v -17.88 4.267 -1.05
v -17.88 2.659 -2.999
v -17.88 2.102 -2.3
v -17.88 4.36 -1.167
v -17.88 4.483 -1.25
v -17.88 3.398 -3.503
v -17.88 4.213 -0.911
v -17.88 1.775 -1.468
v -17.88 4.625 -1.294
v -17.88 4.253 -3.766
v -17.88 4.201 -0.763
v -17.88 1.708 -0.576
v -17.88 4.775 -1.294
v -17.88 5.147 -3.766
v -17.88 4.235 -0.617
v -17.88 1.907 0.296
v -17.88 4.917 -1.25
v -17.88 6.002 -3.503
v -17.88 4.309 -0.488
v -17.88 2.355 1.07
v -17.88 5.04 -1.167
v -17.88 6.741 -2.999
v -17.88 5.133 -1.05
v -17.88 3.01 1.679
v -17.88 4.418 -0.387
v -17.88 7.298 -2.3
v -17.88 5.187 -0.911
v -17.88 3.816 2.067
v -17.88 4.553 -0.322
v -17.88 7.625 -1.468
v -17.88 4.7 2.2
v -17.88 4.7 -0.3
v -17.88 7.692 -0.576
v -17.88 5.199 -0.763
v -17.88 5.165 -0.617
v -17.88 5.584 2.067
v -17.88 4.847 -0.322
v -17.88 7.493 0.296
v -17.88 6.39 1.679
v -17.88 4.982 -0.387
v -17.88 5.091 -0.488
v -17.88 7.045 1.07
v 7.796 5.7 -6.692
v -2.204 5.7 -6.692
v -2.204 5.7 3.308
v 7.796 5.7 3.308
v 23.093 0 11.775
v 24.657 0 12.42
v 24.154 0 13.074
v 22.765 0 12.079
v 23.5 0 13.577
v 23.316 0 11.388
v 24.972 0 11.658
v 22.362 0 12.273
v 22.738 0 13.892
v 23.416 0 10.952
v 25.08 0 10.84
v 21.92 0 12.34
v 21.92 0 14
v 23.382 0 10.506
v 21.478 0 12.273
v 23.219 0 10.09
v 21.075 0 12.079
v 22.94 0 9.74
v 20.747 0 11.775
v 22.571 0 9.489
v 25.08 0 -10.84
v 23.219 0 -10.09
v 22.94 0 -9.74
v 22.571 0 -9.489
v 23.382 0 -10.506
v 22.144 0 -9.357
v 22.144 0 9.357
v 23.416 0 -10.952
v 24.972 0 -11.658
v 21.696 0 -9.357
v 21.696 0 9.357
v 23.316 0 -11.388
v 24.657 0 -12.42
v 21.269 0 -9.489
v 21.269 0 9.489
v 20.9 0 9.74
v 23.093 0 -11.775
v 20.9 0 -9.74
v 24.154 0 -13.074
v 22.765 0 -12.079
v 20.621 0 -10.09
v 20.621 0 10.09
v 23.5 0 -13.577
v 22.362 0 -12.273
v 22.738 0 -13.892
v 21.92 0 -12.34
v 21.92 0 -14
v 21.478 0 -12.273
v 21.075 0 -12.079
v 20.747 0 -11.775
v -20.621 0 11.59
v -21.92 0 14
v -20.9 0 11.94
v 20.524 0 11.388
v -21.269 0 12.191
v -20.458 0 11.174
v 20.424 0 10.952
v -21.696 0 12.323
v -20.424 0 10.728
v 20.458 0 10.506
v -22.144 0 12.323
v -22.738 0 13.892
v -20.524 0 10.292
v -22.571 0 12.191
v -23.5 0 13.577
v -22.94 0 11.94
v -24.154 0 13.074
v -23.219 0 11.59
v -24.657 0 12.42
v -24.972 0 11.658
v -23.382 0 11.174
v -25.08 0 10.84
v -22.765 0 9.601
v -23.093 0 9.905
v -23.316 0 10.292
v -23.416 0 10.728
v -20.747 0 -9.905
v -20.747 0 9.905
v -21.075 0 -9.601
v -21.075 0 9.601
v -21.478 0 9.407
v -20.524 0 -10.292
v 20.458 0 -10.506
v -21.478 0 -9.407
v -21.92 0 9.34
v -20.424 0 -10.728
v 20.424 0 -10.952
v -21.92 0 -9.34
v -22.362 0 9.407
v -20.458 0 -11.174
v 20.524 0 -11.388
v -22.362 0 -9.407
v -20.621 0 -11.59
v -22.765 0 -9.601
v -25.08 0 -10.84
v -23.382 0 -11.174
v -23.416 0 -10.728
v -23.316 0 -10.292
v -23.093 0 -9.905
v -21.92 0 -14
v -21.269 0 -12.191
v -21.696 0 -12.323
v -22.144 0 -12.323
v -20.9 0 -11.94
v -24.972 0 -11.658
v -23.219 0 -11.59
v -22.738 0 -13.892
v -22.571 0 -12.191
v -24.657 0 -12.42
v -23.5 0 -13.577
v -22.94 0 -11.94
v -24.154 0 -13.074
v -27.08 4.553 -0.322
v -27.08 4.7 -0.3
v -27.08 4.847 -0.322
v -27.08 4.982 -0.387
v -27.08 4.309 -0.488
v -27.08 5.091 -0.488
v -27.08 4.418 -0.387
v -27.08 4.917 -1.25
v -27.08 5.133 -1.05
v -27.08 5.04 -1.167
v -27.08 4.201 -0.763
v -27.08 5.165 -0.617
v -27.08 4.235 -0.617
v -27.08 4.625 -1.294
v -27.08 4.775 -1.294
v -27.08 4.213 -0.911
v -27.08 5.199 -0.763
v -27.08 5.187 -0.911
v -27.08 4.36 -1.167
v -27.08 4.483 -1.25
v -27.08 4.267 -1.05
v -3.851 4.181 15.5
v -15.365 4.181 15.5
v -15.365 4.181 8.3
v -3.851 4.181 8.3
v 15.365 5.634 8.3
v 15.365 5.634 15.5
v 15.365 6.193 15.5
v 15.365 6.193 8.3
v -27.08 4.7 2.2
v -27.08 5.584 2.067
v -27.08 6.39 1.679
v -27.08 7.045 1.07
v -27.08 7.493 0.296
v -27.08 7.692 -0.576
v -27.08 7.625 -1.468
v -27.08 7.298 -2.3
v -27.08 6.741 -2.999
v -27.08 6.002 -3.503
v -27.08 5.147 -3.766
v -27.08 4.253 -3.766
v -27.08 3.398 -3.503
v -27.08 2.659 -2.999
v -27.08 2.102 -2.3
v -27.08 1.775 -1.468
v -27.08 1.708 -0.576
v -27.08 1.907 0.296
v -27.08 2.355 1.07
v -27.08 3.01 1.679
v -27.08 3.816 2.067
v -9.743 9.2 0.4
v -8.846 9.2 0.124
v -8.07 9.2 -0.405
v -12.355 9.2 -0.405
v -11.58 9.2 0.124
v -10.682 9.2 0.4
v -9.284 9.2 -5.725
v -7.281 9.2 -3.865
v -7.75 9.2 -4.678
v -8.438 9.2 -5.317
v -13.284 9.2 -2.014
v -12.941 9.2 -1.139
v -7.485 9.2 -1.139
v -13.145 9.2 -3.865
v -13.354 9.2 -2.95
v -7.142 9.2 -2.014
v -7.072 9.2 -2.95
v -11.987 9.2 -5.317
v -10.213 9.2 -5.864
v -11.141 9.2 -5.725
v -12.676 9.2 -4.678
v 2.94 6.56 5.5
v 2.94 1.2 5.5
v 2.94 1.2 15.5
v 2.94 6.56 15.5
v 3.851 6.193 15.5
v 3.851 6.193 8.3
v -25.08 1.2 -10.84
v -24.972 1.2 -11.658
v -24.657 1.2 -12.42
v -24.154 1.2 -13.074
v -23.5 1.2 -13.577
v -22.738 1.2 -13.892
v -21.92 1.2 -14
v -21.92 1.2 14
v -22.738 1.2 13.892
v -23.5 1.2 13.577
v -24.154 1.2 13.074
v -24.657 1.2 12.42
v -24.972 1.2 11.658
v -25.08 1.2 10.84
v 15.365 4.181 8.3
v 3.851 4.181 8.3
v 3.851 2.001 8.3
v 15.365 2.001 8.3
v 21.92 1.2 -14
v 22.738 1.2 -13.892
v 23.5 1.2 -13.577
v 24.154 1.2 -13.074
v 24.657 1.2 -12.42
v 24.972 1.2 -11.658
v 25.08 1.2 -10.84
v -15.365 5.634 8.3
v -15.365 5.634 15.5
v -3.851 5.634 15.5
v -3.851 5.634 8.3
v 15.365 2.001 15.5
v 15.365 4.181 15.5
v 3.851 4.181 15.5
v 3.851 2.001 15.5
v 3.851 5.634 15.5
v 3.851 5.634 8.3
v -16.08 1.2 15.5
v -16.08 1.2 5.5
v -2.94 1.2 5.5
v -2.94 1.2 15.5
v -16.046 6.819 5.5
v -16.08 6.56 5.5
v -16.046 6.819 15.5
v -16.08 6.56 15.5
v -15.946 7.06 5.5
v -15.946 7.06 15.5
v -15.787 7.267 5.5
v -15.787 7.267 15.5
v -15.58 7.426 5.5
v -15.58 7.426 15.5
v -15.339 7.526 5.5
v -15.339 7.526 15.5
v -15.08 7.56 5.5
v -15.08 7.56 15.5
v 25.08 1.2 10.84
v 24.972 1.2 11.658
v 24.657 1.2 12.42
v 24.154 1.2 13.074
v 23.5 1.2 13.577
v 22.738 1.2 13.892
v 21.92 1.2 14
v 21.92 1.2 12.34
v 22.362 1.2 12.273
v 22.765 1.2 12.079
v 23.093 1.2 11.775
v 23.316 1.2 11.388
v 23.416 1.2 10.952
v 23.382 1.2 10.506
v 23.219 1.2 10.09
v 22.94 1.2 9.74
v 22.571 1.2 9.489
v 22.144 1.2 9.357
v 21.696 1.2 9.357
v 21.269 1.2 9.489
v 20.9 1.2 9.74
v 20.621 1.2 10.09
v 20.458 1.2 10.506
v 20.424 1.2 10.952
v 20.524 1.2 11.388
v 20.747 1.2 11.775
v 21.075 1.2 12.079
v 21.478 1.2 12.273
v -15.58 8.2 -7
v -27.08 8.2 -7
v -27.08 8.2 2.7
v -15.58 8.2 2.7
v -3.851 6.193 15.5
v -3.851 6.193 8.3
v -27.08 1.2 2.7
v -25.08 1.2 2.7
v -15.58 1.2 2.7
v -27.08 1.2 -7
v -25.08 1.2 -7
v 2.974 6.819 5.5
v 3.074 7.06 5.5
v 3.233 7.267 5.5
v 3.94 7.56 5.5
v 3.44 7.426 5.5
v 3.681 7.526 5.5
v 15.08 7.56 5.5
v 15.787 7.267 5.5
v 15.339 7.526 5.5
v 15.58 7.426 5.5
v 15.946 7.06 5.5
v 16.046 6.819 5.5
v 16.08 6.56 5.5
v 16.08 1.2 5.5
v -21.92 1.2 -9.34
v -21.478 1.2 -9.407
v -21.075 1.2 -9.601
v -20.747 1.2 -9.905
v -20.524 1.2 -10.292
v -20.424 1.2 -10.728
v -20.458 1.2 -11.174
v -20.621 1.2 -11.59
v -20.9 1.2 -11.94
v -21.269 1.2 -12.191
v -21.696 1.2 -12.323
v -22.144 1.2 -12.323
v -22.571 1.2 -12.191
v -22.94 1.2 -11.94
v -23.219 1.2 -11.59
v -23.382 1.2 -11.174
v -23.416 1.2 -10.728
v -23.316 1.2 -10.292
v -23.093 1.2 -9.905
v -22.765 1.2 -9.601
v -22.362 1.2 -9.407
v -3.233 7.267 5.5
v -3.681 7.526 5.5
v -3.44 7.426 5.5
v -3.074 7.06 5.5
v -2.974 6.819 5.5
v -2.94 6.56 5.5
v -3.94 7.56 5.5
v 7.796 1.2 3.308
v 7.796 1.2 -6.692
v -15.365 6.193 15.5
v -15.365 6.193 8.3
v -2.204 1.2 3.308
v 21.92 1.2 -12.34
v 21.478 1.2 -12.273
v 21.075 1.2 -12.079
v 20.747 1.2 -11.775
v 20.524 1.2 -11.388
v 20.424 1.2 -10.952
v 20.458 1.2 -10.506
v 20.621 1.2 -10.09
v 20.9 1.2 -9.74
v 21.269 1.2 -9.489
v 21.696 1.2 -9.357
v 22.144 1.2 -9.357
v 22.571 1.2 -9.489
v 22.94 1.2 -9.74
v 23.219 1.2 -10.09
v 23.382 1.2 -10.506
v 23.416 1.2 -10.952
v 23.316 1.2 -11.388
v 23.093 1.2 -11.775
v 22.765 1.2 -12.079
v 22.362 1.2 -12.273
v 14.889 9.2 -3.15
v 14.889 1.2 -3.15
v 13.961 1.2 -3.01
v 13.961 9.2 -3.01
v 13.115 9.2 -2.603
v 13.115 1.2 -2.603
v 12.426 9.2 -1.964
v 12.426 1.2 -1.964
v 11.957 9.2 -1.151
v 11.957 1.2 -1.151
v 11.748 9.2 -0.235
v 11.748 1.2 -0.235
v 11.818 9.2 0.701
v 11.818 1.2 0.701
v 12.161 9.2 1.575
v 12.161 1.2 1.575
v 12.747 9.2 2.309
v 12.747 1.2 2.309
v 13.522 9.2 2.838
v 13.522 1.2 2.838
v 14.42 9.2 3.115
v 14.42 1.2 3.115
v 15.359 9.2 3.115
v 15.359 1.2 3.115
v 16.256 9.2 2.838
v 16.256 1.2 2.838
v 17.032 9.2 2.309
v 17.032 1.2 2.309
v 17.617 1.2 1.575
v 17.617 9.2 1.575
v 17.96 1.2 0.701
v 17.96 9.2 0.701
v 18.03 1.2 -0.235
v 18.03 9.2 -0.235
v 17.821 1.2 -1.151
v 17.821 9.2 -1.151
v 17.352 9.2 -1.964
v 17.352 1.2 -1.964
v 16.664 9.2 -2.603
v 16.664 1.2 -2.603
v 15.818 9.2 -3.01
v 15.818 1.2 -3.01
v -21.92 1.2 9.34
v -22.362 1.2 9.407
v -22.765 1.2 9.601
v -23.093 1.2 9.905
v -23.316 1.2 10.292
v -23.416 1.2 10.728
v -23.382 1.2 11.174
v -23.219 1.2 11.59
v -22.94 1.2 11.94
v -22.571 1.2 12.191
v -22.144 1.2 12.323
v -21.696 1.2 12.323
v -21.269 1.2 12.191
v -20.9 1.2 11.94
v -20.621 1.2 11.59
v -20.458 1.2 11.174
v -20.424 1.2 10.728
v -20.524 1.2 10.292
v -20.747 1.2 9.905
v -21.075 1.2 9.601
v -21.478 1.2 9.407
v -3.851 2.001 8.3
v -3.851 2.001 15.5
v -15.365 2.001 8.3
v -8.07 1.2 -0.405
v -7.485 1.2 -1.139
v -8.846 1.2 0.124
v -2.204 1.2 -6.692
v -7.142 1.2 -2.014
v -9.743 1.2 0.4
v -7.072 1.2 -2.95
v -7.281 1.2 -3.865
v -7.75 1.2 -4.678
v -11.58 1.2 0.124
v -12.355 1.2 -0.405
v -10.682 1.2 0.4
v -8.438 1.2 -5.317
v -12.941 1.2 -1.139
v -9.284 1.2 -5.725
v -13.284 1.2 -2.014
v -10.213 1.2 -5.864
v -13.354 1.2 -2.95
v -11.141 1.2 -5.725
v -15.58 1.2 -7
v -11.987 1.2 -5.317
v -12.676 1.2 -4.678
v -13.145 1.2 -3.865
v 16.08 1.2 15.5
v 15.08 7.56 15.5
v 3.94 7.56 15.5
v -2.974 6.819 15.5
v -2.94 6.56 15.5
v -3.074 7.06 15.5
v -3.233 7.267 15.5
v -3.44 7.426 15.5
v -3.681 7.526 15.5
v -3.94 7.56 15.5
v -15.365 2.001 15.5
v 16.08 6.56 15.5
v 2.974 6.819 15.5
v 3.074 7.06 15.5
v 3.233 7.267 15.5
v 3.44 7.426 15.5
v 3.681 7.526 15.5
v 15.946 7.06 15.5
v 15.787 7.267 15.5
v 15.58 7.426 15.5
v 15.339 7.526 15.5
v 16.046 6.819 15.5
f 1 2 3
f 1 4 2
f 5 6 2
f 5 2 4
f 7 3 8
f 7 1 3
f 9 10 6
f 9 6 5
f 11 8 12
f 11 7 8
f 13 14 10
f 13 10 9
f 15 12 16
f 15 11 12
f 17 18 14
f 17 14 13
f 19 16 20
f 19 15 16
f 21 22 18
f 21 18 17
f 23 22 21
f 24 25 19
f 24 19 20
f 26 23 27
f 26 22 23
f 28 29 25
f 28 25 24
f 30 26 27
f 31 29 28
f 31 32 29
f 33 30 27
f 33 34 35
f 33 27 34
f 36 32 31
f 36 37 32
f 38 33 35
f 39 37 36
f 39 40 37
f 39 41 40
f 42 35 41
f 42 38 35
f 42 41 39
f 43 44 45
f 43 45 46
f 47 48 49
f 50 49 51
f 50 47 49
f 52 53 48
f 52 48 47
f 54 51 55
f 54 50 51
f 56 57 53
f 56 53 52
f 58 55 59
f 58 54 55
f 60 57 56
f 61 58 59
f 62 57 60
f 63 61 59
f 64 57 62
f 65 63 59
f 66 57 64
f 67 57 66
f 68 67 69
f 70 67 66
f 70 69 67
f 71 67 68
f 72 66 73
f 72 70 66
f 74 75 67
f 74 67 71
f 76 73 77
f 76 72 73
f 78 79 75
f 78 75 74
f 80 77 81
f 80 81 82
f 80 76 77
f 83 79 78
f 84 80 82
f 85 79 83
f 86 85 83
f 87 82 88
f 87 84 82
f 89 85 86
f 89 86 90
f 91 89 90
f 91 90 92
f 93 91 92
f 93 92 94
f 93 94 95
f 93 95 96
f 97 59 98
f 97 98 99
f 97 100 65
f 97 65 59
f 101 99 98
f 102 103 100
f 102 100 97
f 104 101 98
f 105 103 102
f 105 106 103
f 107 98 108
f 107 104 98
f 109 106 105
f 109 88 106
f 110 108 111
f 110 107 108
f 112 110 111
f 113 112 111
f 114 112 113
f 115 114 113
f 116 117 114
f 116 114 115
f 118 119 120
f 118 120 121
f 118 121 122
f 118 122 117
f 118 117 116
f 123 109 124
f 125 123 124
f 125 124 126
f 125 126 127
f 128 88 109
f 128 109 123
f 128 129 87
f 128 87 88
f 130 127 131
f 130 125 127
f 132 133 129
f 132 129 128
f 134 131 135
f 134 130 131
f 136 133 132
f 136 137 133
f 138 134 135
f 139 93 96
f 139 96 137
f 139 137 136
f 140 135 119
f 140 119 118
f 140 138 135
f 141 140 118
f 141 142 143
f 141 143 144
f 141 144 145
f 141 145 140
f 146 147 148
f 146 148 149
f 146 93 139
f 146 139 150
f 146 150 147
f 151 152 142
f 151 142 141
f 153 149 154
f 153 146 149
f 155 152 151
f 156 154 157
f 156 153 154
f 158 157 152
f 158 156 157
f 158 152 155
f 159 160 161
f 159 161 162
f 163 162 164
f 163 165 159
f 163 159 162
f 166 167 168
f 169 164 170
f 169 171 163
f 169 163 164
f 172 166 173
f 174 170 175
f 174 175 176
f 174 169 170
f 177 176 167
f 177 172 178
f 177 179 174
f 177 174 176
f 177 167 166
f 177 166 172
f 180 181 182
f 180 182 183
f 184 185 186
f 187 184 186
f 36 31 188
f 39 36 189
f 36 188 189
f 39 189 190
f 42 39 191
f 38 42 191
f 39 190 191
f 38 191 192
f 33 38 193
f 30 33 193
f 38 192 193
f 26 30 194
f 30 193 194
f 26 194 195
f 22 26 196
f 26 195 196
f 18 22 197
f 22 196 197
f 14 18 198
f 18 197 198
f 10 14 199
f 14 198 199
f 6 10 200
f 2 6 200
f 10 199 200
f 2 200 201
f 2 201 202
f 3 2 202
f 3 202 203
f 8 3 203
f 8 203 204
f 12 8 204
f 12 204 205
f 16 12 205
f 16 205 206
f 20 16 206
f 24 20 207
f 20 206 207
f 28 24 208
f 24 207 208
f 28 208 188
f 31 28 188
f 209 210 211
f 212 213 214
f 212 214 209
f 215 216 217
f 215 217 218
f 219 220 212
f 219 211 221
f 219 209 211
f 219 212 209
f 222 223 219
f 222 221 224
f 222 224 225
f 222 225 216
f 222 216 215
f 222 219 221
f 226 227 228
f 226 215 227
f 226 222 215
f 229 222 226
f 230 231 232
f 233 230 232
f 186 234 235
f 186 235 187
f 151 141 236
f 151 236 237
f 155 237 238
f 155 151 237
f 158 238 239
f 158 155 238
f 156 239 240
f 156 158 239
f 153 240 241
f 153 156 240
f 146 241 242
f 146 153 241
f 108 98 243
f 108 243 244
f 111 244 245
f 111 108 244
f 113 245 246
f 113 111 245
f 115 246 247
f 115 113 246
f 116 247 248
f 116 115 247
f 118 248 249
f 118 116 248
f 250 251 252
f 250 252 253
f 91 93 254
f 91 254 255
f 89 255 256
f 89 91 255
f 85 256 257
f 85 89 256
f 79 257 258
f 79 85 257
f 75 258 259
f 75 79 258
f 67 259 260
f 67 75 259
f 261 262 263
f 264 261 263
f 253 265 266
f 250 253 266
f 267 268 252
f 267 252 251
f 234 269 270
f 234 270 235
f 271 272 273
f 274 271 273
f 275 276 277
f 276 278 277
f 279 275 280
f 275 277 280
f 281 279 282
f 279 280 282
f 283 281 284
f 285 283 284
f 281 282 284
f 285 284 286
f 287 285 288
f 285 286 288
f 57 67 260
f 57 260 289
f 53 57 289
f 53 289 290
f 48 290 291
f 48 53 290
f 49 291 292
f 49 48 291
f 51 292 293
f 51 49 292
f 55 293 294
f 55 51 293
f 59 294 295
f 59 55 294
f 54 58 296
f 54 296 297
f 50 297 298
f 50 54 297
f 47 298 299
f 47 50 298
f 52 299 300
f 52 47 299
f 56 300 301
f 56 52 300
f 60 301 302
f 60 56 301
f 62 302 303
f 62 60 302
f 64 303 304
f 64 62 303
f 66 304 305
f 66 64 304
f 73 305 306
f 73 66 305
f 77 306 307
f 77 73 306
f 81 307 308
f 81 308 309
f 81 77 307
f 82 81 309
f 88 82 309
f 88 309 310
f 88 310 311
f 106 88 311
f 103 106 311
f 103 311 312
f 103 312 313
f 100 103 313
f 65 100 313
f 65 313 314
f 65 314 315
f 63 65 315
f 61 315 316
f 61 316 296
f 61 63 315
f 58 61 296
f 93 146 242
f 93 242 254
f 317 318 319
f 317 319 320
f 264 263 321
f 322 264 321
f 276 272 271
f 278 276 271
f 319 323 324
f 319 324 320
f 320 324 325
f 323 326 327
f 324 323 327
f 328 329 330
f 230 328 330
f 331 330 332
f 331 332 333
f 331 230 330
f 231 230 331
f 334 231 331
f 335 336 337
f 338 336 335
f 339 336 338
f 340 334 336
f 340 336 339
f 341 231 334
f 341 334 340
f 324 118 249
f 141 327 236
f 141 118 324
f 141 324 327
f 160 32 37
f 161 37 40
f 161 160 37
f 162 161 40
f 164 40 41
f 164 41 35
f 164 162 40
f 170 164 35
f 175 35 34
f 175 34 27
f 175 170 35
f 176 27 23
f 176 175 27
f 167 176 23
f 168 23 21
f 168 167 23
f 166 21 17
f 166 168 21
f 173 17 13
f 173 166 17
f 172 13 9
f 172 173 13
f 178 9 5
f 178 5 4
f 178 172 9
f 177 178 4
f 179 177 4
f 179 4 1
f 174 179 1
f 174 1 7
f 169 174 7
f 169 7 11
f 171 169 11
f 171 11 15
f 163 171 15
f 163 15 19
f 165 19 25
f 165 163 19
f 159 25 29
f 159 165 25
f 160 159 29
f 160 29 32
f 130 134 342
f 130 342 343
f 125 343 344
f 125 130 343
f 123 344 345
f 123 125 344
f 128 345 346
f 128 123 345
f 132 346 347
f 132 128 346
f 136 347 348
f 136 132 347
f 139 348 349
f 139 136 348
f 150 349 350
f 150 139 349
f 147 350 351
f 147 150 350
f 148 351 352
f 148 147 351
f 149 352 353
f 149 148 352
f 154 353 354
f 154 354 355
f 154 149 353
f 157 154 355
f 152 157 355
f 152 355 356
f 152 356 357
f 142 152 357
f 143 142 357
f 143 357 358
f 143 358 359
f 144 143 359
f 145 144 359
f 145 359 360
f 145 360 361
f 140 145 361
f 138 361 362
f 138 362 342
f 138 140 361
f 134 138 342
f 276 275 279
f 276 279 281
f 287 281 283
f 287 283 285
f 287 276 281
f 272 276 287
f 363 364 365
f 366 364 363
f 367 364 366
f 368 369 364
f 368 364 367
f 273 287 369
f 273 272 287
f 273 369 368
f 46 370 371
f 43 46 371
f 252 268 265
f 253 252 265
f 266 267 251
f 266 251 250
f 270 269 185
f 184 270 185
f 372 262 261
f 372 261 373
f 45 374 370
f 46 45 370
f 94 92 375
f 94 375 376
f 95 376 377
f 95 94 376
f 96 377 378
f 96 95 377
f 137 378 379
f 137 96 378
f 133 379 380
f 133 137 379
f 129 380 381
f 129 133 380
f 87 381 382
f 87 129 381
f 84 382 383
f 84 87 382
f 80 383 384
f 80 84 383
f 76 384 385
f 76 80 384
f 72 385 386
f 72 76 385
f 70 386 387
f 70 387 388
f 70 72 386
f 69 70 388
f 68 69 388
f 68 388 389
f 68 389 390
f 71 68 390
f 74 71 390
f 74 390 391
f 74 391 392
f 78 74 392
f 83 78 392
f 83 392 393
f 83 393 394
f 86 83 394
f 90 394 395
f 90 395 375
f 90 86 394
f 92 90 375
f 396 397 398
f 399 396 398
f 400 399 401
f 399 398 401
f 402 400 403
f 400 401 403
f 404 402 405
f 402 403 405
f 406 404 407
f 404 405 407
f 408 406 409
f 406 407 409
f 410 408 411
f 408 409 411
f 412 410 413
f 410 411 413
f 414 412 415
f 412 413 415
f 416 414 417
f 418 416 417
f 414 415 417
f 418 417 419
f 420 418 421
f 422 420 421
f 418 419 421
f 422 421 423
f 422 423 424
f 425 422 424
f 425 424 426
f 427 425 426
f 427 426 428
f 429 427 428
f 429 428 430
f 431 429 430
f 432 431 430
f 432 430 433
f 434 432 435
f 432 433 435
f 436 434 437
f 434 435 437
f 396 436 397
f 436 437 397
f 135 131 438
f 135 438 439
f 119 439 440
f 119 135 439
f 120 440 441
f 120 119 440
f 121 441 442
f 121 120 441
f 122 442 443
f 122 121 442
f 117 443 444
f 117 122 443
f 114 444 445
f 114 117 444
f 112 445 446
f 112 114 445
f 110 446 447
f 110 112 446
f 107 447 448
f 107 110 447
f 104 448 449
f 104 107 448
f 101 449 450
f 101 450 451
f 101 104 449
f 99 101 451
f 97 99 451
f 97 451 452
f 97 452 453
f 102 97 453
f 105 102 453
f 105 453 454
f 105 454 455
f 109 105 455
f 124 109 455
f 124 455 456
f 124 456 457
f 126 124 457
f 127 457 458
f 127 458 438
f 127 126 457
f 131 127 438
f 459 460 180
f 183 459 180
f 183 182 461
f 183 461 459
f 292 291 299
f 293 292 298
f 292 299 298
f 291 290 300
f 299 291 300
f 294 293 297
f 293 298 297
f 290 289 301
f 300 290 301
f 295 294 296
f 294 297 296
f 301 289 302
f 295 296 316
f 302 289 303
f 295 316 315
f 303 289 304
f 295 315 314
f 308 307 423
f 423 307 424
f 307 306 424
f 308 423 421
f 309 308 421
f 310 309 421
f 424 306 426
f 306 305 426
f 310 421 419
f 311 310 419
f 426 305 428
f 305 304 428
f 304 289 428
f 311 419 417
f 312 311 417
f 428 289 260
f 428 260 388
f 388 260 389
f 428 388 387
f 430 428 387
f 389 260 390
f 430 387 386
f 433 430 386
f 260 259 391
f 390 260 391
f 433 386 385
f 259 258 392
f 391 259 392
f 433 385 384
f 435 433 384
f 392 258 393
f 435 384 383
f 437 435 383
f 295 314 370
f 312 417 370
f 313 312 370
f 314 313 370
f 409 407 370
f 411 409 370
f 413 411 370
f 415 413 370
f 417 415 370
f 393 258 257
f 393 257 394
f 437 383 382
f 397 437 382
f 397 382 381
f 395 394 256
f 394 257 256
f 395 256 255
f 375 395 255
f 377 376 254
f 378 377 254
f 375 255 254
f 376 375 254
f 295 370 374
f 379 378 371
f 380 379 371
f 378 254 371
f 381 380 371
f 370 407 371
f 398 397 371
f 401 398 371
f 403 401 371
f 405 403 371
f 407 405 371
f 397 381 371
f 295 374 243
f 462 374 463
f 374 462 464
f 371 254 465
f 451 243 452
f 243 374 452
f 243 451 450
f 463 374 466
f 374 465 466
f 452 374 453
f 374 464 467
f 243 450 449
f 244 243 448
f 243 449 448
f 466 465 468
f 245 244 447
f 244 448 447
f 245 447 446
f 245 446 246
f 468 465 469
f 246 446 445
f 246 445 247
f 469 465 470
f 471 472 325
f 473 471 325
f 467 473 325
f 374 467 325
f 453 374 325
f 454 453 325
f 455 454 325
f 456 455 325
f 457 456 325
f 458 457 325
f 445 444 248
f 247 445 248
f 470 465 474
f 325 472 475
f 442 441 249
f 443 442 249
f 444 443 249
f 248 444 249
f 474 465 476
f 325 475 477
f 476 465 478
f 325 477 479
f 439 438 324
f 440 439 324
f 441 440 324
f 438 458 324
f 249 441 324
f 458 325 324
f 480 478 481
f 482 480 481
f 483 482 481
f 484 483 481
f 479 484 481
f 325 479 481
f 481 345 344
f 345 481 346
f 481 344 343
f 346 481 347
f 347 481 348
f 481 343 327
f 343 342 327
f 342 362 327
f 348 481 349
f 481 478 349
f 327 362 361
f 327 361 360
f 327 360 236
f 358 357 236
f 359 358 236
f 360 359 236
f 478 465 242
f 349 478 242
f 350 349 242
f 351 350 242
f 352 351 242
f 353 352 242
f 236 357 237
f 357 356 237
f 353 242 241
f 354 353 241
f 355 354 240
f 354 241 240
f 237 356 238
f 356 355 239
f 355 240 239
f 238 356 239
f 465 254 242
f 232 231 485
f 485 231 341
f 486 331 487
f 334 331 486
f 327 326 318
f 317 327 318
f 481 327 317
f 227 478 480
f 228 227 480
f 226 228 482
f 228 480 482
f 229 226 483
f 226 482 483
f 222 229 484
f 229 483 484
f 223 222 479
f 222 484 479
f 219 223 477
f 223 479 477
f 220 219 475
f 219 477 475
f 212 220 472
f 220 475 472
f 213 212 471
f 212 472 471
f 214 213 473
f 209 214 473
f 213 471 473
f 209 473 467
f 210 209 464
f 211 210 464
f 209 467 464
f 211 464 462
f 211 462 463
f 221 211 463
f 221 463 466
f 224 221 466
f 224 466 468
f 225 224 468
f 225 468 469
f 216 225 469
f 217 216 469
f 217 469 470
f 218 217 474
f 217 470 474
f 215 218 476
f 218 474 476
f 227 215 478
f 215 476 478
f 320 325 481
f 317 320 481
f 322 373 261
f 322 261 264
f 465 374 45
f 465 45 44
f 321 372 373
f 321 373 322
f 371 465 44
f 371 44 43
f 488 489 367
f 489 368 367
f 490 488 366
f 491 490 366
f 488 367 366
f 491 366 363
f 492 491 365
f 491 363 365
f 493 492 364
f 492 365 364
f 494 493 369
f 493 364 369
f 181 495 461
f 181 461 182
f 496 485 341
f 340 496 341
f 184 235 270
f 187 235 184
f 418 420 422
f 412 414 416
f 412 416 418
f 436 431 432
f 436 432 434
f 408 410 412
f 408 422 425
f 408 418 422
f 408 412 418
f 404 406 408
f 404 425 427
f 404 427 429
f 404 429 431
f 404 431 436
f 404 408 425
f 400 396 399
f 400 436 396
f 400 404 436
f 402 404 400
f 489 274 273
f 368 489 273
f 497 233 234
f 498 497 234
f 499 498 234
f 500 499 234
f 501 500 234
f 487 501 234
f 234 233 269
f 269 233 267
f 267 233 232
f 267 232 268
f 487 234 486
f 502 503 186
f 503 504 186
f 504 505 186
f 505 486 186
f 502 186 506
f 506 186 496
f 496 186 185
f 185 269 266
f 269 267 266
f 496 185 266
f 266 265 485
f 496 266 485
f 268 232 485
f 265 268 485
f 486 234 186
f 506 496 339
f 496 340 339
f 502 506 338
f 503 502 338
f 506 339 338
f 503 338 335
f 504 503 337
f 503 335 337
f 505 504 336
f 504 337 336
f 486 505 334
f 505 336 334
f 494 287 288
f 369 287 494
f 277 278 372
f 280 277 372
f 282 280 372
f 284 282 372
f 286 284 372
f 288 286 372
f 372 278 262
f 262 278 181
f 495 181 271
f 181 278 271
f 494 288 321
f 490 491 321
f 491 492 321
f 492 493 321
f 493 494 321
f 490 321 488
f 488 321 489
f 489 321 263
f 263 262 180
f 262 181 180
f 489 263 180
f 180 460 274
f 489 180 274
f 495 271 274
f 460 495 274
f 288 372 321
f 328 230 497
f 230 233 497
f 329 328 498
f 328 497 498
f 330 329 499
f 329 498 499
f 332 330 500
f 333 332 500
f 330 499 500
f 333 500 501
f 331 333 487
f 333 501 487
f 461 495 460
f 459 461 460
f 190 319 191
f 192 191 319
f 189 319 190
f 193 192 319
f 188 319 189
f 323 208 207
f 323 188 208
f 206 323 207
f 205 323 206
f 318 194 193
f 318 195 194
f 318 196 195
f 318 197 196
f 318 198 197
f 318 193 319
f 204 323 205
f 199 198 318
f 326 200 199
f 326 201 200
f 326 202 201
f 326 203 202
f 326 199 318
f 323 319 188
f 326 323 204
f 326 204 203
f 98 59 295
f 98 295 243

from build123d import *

# Parameters (mm, degrees)
SKETCH_1_R          = 1.5
EXTRUDE_1_DEPTH     = 1.2
SKETCH_2_W          = 13.14
SKETCH_2_H          = 10
EXTRUDE_3_DEPTH     = 6.36
EXTRUDE_3_2_DEPTH   = 6.36
SKETCH_2_4_W        = 11.5
SKETCH_2_4_H        = 9.7
EXTRUDE_4_DEPTH     = 7
SKETCH_2_5_R        = 3.15
EXTRUDE_5_DEPTH     = 8
SKETCH_2_6_W        = 10
SKETCH_2_6_H        = 10
EXTRUDE_6_DEPTH     = 4.5
SKETCH_3_R          = 3
SKETCH_3_R_2        = 0.5
CUT_EXTRUDE_2_DEPTH = 9.2
FILLET_1_R          = 1
FILLET_2_R          = 1
SKETCH_4_W          = 11.514335883
SKETCH_4_H          = 2.179898541
SKETCH_4_H_2        = 0.558948344
CUT_EXTRUDE_3_DEPTH = 7.2


with BuildPart() as part:
    # 草图1 → 凸台-拉伸1 (new body)
    with BuildSketch(Plane(origin=(0, 0, 0), x_dir=(1, 0, 0), z_dir=(0, 1, 0))):
        with BuildLine():
            Line((-21.92, 14), (21.92, 14))
            ThreePointArc((21.92, 14), (24.154457429, 13.074457429), (25.08, 10.84))
            Line((25.08, 10.84), (25.08, -10.84))
            ThreePointArc((25.08, -10.84), (24.154457429, -13.074457429), (21.92, -14))
            Line((21.92, -14), (-21.92, -14))
            ThreePointArc((-21.92, -14), (-24.154457429, -13.074457429), (-25.08, -10.84))
            Line((-25.08, -10.84), (-25.08, 10.84))
            ThreePointArc((-25.08, 10.84), (-24.154457429, 13.074457429), (-21.92, 14))
        make_face()
        with Locations((-21.92, 10.84)):
            Circle(SKETCH_1_R, mode=Mode.SUBTRACT)
        with Locations((21.92, 10.84)):
            Circle(SKETCH_1_R, mode=Mode.SUBTRACT)
        with Locations((21.92, -10.84)):
            Circle(SKETCH_1_R, mode=Mode.SUBTRACT)
        with Locations((-21.92, -10.84)):
            Circle(SKETCH_1_R, mode=Mode.SUBTRACT)
    extrude(amount=EXTRUDE_1_DEPTH)

    # 草图2<4> → 凸台-拉伸4 (add)
    with BuildSketch(Plane(origin=(0, 1.2, 0), x_dir=(1, 0, 0), z_dir=(0, 1, 0))):
        with Locations((-21.33, 2.15)):
            Rectangle(SKETCH_2_4_W, SKETCH_2_4_H)
    extrude(amount=EXTRUDE_4_DEPTH)

    # 草图2<5> → 凸台-拉伸5 (add)
    with BuildSketch(Plane(origin=(0, 1.2, 0), x_dir=(1, 0, 0), z_dir=(0, 1, 0))):
        with Locations((-10.212809233, 2.714457191)):
            Circle(SKETCH_2_5_R)
        with Locations((14.889200829, 0)):
            Circle(SKETCH_2_5_R)
    extrude(amount=EXTRUDE_5_DEPTH)

    # 草图2<6> → 凸台-拉伸6 (add)
    with BuildSketch(Plane(origin=(0, 1.2, 0), x_dir=(1, 0, 0), z_dir=(0, 1, 0))):
        with Locations((2.796183271, 1.692077629)):
            Rectangle(SKETCH_2_6_W, SKETCH_2_6_H)
    extrude(amount=EXTRUDE_6_DEPTH)

    # 草图3 → 切除-拉伸2 (cut)
    with BuildSketch(Plane.ZY.offset(27.08)):
        with Locations((-0.8, 4.7)):
            Circle(SKETCH_3_R)
        with Locations((-0.8, 4.7)):
            Circle(SKETCH_3_R_2, mode=Mode.SUBTRACT)
    extrude(amount=-CUT_EXTRUDE_2_DEPTH, mode=Mode.SUBTRACT)


with BuildPart() as body_2:
    # 草图2 → 凸台-拉伸3 (new body)
    with BuildSketch(Plane(origin=(0, 1.2, 0), x_dir=(1, 0, 0), z_dir=(0, 1, 0))):
        with Locations((-9.51, -10.5)):
            Rectangle(SKETCH_2_W, SKETCH_2_H)
    extrude(amount=EXTRUDE_3_DEPTH)

    # 圆角1
    fillet_1_edges = [body_2.edges().sort_by_distance(p)[0] for p in [
        (-2.94, 7.56, 10.5),
        (-16.08, 7.56, 10.5),
    ]]
    fillet(fillet_1_edges, radius=FILLET_1_R)


with BuildPart() as body_3:
    # 草图2 → Extrude 3 2 (new body)
    with BuildSketch(Plane(origin=(0, 1.2, 0), x_dir=(1, 0, 0), z_dir=(0, 1, 0))):
        with Locations((9.51, -10.5)):
            Rectangle(SKETCH_2_W, SKETCH_2_H)
    extrude(amount=EXTRUDE_3_2_DEPTH)

    # 圆角2
    fillet_2_edges = [body_3.edges().sort_by_distance(p)[0] for p in [
        (16.08, 7.56, 10.5),
        (2.94, 7.56, 10.5),
    ]]
    fillet(fillet_2_edges, radius=FILLET_2_R)


with BuildPart() as cut_extrude_3_tool:
    # 草图4 → 切除-拉伸3 (new body)
    with BuildSketch(Plane.XY.offset(15.5)):
        with Locations((-9.607804494, 3.090839471)):
            Rectangle(SKETCH_4_W, SKETCH_4_H)
        with Locations((-9.607804494, 5.913528608)):
            Rectangle(SKETCH_4_W, SKETCH_4_H_2)
        with Locations((9.607804494, 5.913528608)):
            Rectangle(SKETCH_4_W, SKETCH_4_H_2)
        with Locations((9.607804494, 3.090839471)):
            Rectangle(SKETCH_4_W, SKETCH_4_H)
    extrude(amount=-CUT_EXTRUDE_3_DEPTH)


with BuildPart() as body_2_1:
    add(body_2.part)

    # 切除-拉伸3: cut by cut_extrude_3_tool
    add(cut_extrude_3_tool.part, mode=Mode.SUBTRACT)


with BuildPart() as body_3_1:
    add(body_3.part)

    # 切除-拉伸3: cut by cut_extrude_3_tool
    add(cut_extrude_3_tool.part, mode=Mode.SUBTRACT)


solid = Compound([part.part, body_2_1.part, body_3_1.part])
